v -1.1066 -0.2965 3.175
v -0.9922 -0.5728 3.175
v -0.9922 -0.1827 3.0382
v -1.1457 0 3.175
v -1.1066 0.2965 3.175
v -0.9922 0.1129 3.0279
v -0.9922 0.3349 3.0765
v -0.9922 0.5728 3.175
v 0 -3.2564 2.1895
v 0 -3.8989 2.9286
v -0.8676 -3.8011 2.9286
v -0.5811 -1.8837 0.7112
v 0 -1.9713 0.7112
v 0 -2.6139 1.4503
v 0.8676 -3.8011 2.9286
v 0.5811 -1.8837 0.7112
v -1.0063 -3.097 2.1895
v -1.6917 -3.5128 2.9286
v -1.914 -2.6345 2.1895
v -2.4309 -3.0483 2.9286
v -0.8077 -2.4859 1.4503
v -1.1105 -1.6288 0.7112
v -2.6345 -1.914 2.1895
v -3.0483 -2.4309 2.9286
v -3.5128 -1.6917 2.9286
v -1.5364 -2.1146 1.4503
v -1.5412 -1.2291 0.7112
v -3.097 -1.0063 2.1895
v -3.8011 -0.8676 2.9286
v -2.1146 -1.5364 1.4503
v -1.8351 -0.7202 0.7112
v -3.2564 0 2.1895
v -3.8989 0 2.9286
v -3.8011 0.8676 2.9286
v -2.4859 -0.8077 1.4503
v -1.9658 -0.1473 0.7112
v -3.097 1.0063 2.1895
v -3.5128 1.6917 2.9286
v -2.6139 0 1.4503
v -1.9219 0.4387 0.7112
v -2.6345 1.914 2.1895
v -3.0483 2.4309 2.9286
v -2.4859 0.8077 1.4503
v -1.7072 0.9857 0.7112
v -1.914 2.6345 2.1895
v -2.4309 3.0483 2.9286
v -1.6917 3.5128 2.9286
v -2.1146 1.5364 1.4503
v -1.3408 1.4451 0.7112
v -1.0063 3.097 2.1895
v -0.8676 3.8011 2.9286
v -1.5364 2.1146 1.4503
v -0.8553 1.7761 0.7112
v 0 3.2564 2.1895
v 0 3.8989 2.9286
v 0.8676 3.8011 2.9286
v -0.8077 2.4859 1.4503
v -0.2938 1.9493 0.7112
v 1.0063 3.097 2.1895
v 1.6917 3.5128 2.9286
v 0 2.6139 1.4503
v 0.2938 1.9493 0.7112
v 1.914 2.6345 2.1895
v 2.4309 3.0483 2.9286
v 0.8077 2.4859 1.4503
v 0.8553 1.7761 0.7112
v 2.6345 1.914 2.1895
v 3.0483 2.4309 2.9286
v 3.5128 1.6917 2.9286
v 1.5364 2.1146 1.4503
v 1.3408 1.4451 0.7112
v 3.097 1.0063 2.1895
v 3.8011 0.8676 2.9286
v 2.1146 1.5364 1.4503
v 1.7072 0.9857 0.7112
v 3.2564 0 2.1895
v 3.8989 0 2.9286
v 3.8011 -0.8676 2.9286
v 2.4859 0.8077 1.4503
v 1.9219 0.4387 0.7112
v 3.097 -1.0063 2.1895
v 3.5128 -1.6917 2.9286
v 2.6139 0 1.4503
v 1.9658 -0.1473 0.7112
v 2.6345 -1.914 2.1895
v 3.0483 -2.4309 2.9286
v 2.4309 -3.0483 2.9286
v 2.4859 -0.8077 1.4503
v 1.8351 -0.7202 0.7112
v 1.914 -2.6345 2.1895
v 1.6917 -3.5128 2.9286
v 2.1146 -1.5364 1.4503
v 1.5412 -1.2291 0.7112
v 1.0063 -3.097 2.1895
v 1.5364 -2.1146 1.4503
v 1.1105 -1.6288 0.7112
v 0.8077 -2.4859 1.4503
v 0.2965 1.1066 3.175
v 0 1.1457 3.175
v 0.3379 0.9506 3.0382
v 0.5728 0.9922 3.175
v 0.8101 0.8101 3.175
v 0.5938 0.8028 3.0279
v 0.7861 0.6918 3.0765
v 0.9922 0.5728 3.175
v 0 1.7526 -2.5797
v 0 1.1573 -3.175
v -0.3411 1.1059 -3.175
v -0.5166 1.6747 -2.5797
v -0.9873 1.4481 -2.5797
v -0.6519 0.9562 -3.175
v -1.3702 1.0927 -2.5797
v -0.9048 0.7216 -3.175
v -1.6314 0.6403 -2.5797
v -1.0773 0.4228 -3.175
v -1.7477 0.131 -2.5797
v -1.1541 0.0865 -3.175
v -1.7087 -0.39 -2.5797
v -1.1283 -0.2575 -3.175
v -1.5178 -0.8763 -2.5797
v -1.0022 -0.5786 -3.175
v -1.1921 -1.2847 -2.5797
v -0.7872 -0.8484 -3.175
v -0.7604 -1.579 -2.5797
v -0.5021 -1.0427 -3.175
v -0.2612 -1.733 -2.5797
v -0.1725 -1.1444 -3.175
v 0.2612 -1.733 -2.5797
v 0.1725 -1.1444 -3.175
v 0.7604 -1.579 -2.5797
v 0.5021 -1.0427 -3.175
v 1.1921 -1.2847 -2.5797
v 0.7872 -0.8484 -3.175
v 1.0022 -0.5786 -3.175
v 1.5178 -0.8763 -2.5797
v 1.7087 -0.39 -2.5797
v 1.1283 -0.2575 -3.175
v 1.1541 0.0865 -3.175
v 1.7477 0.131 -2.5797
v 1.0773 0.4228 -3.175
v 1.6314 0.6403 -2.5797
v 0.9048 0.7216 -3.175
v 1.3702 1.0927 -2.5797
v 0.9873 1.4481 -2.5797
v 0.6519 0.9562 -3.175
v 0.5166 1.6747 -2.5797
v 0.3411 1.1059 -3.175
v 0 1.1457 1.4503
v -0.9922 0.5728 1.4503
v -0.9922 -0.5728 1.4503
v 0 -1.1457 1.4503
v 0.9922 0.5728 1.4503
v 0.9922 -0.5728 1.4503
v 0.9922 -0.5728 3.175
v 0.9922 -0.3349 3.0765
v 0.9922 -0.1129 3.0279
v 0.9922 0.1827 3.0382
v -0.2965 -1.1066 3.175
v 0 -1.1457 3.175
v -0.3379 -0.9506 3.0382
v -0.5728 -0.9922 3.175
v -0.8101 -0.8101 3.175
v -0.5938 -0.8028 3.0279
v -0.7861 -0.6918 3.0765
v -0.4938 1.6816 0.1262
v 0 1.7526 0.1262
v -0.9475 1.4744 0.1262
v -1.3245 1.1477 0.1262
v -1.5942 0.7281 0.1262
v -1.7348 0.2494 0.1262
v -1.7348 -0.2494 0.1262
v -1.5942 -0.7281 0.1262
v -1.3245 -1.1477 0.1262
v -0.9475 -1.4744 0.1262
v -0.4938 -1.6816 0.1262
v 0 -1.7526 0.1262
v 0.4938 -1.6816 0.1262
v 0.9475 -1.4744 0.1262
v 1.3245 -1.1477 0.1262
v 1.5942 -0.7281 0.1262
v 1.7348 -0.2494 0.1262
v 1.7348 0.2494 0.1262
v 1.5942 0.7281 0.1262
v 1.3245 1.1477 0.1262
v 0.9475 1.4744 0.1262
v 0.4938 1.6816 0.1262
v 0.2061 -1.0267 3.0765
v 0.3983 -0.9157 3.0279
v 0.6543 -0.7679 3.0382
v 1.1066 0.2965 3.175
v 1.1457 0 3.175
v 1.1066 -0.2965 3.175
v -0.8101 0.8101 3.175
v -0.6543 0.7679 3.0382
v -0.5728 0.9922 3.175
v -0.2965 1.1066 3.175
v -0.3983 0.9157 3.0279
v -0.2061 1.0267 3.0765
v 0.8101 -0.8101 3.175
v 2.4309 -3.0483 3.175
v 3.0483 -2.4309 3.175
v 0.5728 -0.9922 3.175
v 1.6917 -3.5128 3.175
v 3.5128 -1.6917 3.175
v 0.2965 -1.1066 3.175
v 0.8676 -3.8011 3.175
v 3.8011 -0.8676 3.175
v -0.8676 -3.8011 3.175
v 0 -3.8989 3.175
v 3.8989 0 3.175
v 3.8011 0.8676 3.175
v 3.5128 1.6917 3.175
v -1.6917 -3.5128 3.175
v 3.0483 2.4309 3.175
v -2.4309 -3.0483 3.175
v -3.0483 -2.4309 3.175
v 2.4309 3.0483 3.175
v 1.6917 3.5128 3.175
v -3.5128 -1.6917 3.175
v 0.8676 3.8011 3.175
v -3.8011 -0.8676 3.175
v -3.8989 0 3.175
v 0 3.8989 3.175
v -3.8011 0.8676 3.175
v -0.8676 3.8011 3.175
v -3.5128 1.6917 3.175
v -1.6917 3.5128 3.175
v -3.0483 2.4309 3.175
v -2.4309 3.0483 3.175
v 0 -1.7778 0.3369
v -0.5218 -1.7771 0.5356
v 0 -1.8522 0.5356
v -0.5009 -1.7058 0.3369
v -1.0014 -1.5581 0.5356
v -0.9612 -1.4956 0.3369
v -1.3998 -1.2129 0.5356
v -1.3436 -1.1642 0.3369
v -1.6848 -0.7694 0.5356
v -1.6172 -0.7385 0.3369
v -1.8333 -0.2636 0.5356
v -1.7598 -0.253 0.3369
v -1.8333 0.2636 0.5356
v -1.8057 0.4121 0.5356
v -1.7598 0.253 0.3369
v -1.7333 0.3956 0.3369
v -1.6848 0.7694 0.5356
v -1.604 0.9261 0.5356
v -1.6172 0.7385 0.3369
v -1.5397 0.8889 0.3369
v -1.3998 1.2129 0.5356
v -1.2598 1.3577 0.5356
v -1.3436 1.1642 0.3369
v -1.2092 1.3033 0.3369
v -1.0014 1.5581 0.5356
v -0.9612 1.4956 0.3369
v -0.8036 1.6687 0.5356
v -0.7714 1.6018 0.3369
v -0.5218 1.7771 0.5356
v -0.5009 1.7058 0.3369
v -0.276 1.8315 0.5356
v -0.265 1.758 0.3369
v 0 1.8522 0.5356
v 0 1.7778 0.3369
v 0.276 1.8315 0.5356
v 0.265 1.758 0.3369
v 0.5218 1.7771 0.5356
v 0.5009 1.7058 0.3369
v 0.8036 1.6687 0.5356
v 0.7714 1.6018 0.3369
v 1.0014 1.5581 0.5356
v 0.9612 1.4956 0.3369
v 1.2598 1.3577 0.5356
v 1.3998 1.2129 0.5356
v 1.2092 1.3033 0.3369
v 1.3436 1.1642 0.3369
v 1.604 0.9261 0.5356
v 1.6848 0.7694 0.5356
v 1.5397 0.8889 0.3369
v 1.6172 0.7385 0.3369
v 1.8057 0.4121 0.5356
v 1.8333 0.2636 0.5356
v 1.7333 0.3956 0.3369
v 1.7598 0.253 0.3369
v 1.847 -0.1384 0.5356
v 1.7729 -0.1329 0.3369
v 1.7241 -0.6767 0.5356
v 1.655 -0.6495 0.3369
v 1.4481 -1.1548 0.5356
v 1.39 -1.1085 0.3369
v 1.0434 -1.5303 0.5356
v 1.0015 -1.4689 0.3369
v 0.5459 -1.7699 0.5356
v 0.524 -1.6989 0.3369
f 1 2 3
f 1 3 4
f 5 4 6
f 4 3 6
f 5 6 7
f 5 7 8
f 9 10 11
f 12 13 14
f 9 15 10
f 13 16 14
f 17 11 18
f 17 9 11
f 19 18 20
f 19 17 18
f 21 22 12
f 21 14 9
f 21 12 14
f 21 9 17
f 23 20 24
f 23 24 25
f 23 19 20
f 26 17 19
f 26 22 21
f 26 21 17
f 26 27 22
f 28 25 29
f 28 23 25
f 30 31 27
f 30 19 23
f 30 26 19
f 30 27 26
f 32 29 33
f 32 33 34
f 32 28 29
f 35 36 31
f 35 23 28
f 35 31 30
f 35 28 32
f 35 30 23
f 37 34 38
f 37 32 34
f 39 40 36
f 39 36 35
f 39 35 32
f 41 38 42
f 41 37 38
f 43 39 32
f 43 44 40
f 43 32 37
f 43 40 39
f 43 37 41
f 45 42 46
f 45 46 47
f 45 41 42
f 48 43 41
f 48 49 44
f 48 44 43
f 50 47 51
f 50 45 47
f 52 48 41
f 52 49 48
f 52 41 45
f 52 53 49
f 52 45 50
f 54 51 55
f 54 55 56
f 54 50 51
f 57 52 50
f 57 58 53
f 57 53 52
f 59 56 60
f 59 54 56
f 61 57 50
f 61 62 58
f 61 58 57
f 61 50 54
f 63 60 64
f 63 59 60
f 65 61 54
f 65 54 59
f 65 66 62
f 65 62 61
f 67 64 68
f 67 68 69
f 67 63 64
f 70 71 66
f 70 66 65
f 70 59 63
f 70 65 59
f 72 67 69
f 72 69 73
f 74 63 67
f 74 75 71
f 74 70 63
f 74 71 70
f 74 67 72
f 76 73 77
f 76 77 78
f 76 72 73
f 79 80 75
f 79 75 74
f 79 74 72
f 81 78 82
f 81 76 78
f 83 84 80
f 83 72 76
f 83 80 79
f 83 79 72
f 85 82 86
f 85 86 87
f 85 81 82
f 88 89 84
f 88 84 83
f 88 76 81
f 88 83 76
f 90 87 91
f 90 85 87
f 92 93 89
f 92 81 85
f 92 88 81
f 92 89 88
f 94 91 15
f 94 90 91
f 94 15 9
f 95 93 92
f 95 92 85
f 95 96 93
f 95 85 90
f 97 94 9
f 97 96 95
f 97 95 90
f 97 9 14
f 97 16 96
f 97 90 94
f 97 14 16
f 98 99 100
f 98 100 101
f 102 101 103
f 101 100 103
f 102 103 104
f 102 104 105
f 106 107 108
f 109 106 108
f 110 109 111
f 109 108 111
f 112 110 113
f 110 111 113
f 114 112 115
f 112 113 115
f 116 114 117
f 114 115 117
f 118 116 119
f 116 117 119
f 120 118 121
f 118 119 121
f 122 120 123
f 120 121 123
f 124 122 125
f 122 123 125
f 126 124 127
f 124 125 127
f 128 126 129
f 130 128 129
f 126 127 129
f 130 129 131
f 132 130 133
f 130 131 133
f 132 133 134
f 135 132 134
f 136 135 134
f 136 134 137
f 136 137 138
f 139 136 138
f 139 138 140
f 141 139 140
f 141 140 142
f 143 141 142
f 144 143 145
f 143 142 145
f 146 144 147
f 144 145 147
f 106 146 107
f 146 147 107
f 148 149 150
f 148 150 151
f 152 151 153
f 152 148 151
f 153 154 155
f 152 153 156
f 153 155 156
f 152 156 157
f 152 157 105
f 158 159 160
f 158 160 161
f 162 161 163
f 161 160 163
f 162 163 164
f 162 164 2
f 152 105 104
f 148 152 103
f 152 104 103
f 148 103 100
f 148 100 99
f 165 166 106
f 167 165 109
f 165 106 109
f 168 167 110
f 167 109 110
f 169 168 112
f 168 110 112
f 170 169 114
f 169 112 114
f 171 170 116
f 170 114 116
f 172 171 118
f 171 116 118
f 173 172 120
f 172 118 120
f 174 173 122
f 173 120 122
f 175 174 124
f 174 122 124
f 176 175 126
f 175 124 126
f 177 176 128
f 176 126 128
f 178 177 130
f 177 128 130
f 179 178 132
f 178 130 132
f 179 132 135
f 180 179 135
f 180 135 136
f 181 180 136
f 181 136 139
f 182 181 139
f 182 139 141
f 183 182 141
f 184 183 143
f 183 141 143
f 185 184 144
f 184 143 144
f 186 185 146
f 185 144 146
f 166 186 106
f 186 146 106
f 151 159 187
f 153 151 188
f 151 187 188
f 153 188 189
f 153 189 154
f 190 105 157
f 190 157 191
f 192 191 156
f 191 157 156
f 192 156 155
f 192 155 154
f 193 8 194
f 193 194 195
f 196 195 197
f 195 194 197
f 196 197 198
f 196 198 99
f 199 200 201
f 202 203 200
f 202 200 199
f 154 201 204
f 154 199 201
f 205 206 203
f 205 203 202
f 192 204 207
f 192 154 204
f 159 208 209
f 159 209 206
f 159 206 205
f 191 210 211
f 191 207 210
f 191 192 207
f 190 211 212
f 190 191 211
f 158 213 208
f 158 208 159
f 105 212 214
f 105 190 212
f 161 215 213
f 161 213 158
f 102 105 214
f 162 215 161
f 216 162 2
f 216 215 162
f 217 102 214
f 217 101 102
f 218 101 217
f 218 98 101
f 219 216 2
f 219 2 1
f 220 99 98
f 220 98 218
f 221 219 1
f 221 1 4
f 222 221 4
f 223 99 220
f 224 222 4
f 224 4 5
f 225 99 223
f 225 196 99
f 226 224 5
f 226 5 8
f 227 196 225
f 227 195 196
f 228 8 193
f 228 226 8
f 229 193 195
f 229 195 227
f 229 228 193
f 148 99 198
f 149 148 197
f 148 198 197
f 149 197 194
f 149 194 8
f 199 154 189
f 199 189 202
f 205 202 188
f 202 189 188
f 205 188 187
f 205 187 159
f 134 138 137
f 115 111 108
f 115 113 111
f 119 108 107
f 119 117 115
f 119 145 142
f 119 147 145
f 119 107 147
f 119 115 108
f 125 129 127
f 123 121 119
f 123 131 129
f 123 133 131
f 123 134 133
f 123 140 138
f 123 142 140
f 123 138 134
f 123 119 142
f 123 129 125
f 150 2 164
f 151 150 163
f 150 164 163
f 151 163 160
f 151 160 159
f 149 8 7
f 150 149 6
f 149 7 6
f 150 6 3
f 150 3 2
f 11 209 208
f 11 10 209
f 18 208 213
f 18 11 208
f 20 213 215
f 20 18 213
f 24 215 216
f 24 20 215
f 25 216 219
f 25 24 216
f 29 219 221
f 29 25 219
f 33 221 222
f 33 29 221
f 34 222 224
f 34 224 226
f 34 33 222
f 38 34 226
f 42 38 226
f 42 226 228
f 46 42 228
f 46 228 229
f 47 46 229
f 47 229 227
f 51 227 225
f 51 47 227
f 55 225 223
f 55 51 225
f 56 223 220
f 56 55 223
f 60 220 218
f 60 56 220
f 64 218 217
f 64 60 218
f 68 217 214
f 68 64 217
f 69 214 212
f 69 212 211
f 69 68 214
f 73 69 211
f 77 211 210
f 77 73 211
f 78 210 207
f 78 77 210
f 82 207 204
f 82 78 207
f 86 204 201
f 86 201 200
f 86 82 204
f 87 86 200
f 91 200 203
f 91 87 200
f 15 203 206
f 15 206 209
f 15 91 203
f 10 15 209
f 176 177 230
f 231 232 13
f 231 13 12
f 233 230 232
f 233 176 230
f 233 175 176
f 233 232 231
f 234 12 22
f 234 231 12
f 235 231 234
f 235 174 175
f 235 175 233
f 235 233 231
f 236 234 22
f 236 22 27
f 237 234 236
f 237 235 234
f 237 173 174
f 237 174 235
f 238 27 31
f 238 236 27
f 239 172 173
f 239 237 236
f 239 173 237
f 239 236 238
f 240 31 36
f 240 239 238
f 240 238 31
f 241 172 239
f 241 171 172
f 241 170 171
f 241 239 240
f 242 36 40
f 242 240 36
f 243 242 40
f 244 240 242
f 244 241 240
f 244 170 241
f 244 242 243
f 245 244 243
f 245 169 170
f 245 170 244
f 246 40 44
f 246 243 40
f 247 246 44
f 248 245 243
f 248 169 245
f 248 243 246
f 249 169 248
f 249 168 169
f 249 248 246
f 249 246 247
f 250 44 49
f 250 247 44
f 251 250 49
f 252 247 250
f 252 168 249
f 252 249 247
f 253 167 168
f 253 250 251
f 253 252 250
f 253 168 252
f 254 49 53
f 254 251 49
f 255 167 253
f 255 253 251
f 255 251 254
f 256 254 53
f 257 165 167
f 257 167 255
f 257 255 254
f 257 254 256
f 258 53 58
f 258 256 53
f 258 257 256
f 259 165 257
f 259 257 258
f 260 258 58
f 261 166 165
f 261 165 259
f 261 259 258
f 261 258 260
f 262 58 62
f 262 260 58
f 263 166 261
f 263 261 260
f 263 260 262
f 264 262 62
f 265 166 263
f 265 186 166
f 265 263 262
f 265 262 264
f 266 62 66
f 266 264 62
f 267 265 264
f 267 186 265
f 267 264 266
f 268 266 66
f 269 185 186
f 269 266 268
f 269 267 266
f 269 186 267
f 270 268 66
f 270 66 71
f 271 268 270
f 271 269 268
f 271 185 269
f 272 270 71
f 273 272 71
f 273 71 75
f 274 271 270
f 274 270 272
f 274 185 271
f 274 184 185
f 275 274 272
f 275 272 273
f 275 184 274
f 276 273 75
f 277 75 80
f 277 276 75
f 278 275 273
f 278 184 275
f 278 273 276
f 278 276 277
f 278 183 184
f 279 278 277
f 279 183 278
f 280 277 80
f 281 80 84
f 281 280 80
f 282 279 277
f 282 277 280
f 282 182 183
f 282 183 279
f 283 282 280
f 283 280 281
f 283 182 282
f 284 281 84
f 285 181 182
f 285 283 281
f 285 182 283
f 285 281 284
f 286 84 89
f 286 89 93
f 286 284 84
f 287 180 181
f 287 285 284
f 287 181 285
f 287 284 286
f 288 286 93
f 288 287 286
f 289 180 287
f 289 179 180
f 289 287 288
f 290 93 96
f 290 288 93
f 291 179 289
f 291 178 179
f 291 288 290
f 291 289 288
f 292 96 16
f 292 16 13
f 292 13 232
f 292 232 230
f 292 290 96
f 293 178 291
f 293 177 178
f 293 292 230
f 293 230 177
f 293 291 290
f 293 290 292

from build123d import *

# Parameters (mm, degrees)
SKETCH12_W         = 6.35
SKETCH12_H         = 1.7526
CHAMFER1_SIZE      = 0.5953125
CUT_EXTRUDE2_DEPTH = 1.72466


with BuildPart() as part:
    # Sketch12 → Revolve3 (revolve)
    with BuildSketch(Plane(origin=(0, 0, 0), x_dir=(0, 0, -1), z_dir=(1, 0, 0))):
        with Locations((0, 0.8763)):
            Rectangle(SKETCH12_W, SKETCH12_H)
    revolve(axis=Axis((0, 0, -3.175), (0, 0, 1)))

    # Sketch7 → Revolve2 (revolve)
    with BuildSketch(Plane(origin=(0, 0, 0), x_dir=(0, 0, -1), z_dir=(1, 0, 0))):
        with BuildLine():
            Line((-3.175, 3.8989), (-2.92862, 3.8989))
            Line((-2.92862, 3.8989), (-0.7112, 1.971326202))
            ThreePointArc((-0.7112, 1.971326202), (-0.43847117, 1.809069598), (-0.126190199, 1.7526))
            Line((-0.126190199, 1.7526), (-0.126190199, 0))
            Line((-0.126190199, 0), (-3.175, 0))
            Line((-3.175, 0), (-3.175, 3.8989))
        make_face()
    revolve(axis=Axis((0, 0, 3.175), (0, 0, -1)))

    # Chamfer1
    chamfer1_edges = [part.edges().sort_by_distance(p)[0] for p in [
        (0, -1.7526, -3.175),
    ]]
    chamfer(chamfer1_edges, length=CHAMFER1_SIZE)

    # Sketch5 → Cut-Extrude2 (cut)
    with BuildSketch(Plane.XY.offset(3.175)):
        Polygon((0, 1.14567944), (-0.9921875, 0.57283972), (-0.9921875, -0.57283972), (0, -1.14567944), (0.9921875, -0.57283972), (0.9921875, 0.57283972), align=None)
    extrude(amount=-CUT_EXTRUDE2_DEPTH, mode=Mode.SUBTRACT)

    # Cut-Extrude3 cone 1 section (through the dimple's axis) → Cut-Extrude3 (revolve, cut)
    with BuildSketch(Plane(origin=(0, 0, 3.175), x_dir=(0, -1, 0), z_dir=(1, 0, 0))):
        Polygon((0, 0), (1.14567944, 0), (0, 1.14567944), align=None)
    revolve(axis=Axis((0, 0, 3.175), (0, 0, -1)), mode=Mode.SUBTRACT)


solid = part.part
